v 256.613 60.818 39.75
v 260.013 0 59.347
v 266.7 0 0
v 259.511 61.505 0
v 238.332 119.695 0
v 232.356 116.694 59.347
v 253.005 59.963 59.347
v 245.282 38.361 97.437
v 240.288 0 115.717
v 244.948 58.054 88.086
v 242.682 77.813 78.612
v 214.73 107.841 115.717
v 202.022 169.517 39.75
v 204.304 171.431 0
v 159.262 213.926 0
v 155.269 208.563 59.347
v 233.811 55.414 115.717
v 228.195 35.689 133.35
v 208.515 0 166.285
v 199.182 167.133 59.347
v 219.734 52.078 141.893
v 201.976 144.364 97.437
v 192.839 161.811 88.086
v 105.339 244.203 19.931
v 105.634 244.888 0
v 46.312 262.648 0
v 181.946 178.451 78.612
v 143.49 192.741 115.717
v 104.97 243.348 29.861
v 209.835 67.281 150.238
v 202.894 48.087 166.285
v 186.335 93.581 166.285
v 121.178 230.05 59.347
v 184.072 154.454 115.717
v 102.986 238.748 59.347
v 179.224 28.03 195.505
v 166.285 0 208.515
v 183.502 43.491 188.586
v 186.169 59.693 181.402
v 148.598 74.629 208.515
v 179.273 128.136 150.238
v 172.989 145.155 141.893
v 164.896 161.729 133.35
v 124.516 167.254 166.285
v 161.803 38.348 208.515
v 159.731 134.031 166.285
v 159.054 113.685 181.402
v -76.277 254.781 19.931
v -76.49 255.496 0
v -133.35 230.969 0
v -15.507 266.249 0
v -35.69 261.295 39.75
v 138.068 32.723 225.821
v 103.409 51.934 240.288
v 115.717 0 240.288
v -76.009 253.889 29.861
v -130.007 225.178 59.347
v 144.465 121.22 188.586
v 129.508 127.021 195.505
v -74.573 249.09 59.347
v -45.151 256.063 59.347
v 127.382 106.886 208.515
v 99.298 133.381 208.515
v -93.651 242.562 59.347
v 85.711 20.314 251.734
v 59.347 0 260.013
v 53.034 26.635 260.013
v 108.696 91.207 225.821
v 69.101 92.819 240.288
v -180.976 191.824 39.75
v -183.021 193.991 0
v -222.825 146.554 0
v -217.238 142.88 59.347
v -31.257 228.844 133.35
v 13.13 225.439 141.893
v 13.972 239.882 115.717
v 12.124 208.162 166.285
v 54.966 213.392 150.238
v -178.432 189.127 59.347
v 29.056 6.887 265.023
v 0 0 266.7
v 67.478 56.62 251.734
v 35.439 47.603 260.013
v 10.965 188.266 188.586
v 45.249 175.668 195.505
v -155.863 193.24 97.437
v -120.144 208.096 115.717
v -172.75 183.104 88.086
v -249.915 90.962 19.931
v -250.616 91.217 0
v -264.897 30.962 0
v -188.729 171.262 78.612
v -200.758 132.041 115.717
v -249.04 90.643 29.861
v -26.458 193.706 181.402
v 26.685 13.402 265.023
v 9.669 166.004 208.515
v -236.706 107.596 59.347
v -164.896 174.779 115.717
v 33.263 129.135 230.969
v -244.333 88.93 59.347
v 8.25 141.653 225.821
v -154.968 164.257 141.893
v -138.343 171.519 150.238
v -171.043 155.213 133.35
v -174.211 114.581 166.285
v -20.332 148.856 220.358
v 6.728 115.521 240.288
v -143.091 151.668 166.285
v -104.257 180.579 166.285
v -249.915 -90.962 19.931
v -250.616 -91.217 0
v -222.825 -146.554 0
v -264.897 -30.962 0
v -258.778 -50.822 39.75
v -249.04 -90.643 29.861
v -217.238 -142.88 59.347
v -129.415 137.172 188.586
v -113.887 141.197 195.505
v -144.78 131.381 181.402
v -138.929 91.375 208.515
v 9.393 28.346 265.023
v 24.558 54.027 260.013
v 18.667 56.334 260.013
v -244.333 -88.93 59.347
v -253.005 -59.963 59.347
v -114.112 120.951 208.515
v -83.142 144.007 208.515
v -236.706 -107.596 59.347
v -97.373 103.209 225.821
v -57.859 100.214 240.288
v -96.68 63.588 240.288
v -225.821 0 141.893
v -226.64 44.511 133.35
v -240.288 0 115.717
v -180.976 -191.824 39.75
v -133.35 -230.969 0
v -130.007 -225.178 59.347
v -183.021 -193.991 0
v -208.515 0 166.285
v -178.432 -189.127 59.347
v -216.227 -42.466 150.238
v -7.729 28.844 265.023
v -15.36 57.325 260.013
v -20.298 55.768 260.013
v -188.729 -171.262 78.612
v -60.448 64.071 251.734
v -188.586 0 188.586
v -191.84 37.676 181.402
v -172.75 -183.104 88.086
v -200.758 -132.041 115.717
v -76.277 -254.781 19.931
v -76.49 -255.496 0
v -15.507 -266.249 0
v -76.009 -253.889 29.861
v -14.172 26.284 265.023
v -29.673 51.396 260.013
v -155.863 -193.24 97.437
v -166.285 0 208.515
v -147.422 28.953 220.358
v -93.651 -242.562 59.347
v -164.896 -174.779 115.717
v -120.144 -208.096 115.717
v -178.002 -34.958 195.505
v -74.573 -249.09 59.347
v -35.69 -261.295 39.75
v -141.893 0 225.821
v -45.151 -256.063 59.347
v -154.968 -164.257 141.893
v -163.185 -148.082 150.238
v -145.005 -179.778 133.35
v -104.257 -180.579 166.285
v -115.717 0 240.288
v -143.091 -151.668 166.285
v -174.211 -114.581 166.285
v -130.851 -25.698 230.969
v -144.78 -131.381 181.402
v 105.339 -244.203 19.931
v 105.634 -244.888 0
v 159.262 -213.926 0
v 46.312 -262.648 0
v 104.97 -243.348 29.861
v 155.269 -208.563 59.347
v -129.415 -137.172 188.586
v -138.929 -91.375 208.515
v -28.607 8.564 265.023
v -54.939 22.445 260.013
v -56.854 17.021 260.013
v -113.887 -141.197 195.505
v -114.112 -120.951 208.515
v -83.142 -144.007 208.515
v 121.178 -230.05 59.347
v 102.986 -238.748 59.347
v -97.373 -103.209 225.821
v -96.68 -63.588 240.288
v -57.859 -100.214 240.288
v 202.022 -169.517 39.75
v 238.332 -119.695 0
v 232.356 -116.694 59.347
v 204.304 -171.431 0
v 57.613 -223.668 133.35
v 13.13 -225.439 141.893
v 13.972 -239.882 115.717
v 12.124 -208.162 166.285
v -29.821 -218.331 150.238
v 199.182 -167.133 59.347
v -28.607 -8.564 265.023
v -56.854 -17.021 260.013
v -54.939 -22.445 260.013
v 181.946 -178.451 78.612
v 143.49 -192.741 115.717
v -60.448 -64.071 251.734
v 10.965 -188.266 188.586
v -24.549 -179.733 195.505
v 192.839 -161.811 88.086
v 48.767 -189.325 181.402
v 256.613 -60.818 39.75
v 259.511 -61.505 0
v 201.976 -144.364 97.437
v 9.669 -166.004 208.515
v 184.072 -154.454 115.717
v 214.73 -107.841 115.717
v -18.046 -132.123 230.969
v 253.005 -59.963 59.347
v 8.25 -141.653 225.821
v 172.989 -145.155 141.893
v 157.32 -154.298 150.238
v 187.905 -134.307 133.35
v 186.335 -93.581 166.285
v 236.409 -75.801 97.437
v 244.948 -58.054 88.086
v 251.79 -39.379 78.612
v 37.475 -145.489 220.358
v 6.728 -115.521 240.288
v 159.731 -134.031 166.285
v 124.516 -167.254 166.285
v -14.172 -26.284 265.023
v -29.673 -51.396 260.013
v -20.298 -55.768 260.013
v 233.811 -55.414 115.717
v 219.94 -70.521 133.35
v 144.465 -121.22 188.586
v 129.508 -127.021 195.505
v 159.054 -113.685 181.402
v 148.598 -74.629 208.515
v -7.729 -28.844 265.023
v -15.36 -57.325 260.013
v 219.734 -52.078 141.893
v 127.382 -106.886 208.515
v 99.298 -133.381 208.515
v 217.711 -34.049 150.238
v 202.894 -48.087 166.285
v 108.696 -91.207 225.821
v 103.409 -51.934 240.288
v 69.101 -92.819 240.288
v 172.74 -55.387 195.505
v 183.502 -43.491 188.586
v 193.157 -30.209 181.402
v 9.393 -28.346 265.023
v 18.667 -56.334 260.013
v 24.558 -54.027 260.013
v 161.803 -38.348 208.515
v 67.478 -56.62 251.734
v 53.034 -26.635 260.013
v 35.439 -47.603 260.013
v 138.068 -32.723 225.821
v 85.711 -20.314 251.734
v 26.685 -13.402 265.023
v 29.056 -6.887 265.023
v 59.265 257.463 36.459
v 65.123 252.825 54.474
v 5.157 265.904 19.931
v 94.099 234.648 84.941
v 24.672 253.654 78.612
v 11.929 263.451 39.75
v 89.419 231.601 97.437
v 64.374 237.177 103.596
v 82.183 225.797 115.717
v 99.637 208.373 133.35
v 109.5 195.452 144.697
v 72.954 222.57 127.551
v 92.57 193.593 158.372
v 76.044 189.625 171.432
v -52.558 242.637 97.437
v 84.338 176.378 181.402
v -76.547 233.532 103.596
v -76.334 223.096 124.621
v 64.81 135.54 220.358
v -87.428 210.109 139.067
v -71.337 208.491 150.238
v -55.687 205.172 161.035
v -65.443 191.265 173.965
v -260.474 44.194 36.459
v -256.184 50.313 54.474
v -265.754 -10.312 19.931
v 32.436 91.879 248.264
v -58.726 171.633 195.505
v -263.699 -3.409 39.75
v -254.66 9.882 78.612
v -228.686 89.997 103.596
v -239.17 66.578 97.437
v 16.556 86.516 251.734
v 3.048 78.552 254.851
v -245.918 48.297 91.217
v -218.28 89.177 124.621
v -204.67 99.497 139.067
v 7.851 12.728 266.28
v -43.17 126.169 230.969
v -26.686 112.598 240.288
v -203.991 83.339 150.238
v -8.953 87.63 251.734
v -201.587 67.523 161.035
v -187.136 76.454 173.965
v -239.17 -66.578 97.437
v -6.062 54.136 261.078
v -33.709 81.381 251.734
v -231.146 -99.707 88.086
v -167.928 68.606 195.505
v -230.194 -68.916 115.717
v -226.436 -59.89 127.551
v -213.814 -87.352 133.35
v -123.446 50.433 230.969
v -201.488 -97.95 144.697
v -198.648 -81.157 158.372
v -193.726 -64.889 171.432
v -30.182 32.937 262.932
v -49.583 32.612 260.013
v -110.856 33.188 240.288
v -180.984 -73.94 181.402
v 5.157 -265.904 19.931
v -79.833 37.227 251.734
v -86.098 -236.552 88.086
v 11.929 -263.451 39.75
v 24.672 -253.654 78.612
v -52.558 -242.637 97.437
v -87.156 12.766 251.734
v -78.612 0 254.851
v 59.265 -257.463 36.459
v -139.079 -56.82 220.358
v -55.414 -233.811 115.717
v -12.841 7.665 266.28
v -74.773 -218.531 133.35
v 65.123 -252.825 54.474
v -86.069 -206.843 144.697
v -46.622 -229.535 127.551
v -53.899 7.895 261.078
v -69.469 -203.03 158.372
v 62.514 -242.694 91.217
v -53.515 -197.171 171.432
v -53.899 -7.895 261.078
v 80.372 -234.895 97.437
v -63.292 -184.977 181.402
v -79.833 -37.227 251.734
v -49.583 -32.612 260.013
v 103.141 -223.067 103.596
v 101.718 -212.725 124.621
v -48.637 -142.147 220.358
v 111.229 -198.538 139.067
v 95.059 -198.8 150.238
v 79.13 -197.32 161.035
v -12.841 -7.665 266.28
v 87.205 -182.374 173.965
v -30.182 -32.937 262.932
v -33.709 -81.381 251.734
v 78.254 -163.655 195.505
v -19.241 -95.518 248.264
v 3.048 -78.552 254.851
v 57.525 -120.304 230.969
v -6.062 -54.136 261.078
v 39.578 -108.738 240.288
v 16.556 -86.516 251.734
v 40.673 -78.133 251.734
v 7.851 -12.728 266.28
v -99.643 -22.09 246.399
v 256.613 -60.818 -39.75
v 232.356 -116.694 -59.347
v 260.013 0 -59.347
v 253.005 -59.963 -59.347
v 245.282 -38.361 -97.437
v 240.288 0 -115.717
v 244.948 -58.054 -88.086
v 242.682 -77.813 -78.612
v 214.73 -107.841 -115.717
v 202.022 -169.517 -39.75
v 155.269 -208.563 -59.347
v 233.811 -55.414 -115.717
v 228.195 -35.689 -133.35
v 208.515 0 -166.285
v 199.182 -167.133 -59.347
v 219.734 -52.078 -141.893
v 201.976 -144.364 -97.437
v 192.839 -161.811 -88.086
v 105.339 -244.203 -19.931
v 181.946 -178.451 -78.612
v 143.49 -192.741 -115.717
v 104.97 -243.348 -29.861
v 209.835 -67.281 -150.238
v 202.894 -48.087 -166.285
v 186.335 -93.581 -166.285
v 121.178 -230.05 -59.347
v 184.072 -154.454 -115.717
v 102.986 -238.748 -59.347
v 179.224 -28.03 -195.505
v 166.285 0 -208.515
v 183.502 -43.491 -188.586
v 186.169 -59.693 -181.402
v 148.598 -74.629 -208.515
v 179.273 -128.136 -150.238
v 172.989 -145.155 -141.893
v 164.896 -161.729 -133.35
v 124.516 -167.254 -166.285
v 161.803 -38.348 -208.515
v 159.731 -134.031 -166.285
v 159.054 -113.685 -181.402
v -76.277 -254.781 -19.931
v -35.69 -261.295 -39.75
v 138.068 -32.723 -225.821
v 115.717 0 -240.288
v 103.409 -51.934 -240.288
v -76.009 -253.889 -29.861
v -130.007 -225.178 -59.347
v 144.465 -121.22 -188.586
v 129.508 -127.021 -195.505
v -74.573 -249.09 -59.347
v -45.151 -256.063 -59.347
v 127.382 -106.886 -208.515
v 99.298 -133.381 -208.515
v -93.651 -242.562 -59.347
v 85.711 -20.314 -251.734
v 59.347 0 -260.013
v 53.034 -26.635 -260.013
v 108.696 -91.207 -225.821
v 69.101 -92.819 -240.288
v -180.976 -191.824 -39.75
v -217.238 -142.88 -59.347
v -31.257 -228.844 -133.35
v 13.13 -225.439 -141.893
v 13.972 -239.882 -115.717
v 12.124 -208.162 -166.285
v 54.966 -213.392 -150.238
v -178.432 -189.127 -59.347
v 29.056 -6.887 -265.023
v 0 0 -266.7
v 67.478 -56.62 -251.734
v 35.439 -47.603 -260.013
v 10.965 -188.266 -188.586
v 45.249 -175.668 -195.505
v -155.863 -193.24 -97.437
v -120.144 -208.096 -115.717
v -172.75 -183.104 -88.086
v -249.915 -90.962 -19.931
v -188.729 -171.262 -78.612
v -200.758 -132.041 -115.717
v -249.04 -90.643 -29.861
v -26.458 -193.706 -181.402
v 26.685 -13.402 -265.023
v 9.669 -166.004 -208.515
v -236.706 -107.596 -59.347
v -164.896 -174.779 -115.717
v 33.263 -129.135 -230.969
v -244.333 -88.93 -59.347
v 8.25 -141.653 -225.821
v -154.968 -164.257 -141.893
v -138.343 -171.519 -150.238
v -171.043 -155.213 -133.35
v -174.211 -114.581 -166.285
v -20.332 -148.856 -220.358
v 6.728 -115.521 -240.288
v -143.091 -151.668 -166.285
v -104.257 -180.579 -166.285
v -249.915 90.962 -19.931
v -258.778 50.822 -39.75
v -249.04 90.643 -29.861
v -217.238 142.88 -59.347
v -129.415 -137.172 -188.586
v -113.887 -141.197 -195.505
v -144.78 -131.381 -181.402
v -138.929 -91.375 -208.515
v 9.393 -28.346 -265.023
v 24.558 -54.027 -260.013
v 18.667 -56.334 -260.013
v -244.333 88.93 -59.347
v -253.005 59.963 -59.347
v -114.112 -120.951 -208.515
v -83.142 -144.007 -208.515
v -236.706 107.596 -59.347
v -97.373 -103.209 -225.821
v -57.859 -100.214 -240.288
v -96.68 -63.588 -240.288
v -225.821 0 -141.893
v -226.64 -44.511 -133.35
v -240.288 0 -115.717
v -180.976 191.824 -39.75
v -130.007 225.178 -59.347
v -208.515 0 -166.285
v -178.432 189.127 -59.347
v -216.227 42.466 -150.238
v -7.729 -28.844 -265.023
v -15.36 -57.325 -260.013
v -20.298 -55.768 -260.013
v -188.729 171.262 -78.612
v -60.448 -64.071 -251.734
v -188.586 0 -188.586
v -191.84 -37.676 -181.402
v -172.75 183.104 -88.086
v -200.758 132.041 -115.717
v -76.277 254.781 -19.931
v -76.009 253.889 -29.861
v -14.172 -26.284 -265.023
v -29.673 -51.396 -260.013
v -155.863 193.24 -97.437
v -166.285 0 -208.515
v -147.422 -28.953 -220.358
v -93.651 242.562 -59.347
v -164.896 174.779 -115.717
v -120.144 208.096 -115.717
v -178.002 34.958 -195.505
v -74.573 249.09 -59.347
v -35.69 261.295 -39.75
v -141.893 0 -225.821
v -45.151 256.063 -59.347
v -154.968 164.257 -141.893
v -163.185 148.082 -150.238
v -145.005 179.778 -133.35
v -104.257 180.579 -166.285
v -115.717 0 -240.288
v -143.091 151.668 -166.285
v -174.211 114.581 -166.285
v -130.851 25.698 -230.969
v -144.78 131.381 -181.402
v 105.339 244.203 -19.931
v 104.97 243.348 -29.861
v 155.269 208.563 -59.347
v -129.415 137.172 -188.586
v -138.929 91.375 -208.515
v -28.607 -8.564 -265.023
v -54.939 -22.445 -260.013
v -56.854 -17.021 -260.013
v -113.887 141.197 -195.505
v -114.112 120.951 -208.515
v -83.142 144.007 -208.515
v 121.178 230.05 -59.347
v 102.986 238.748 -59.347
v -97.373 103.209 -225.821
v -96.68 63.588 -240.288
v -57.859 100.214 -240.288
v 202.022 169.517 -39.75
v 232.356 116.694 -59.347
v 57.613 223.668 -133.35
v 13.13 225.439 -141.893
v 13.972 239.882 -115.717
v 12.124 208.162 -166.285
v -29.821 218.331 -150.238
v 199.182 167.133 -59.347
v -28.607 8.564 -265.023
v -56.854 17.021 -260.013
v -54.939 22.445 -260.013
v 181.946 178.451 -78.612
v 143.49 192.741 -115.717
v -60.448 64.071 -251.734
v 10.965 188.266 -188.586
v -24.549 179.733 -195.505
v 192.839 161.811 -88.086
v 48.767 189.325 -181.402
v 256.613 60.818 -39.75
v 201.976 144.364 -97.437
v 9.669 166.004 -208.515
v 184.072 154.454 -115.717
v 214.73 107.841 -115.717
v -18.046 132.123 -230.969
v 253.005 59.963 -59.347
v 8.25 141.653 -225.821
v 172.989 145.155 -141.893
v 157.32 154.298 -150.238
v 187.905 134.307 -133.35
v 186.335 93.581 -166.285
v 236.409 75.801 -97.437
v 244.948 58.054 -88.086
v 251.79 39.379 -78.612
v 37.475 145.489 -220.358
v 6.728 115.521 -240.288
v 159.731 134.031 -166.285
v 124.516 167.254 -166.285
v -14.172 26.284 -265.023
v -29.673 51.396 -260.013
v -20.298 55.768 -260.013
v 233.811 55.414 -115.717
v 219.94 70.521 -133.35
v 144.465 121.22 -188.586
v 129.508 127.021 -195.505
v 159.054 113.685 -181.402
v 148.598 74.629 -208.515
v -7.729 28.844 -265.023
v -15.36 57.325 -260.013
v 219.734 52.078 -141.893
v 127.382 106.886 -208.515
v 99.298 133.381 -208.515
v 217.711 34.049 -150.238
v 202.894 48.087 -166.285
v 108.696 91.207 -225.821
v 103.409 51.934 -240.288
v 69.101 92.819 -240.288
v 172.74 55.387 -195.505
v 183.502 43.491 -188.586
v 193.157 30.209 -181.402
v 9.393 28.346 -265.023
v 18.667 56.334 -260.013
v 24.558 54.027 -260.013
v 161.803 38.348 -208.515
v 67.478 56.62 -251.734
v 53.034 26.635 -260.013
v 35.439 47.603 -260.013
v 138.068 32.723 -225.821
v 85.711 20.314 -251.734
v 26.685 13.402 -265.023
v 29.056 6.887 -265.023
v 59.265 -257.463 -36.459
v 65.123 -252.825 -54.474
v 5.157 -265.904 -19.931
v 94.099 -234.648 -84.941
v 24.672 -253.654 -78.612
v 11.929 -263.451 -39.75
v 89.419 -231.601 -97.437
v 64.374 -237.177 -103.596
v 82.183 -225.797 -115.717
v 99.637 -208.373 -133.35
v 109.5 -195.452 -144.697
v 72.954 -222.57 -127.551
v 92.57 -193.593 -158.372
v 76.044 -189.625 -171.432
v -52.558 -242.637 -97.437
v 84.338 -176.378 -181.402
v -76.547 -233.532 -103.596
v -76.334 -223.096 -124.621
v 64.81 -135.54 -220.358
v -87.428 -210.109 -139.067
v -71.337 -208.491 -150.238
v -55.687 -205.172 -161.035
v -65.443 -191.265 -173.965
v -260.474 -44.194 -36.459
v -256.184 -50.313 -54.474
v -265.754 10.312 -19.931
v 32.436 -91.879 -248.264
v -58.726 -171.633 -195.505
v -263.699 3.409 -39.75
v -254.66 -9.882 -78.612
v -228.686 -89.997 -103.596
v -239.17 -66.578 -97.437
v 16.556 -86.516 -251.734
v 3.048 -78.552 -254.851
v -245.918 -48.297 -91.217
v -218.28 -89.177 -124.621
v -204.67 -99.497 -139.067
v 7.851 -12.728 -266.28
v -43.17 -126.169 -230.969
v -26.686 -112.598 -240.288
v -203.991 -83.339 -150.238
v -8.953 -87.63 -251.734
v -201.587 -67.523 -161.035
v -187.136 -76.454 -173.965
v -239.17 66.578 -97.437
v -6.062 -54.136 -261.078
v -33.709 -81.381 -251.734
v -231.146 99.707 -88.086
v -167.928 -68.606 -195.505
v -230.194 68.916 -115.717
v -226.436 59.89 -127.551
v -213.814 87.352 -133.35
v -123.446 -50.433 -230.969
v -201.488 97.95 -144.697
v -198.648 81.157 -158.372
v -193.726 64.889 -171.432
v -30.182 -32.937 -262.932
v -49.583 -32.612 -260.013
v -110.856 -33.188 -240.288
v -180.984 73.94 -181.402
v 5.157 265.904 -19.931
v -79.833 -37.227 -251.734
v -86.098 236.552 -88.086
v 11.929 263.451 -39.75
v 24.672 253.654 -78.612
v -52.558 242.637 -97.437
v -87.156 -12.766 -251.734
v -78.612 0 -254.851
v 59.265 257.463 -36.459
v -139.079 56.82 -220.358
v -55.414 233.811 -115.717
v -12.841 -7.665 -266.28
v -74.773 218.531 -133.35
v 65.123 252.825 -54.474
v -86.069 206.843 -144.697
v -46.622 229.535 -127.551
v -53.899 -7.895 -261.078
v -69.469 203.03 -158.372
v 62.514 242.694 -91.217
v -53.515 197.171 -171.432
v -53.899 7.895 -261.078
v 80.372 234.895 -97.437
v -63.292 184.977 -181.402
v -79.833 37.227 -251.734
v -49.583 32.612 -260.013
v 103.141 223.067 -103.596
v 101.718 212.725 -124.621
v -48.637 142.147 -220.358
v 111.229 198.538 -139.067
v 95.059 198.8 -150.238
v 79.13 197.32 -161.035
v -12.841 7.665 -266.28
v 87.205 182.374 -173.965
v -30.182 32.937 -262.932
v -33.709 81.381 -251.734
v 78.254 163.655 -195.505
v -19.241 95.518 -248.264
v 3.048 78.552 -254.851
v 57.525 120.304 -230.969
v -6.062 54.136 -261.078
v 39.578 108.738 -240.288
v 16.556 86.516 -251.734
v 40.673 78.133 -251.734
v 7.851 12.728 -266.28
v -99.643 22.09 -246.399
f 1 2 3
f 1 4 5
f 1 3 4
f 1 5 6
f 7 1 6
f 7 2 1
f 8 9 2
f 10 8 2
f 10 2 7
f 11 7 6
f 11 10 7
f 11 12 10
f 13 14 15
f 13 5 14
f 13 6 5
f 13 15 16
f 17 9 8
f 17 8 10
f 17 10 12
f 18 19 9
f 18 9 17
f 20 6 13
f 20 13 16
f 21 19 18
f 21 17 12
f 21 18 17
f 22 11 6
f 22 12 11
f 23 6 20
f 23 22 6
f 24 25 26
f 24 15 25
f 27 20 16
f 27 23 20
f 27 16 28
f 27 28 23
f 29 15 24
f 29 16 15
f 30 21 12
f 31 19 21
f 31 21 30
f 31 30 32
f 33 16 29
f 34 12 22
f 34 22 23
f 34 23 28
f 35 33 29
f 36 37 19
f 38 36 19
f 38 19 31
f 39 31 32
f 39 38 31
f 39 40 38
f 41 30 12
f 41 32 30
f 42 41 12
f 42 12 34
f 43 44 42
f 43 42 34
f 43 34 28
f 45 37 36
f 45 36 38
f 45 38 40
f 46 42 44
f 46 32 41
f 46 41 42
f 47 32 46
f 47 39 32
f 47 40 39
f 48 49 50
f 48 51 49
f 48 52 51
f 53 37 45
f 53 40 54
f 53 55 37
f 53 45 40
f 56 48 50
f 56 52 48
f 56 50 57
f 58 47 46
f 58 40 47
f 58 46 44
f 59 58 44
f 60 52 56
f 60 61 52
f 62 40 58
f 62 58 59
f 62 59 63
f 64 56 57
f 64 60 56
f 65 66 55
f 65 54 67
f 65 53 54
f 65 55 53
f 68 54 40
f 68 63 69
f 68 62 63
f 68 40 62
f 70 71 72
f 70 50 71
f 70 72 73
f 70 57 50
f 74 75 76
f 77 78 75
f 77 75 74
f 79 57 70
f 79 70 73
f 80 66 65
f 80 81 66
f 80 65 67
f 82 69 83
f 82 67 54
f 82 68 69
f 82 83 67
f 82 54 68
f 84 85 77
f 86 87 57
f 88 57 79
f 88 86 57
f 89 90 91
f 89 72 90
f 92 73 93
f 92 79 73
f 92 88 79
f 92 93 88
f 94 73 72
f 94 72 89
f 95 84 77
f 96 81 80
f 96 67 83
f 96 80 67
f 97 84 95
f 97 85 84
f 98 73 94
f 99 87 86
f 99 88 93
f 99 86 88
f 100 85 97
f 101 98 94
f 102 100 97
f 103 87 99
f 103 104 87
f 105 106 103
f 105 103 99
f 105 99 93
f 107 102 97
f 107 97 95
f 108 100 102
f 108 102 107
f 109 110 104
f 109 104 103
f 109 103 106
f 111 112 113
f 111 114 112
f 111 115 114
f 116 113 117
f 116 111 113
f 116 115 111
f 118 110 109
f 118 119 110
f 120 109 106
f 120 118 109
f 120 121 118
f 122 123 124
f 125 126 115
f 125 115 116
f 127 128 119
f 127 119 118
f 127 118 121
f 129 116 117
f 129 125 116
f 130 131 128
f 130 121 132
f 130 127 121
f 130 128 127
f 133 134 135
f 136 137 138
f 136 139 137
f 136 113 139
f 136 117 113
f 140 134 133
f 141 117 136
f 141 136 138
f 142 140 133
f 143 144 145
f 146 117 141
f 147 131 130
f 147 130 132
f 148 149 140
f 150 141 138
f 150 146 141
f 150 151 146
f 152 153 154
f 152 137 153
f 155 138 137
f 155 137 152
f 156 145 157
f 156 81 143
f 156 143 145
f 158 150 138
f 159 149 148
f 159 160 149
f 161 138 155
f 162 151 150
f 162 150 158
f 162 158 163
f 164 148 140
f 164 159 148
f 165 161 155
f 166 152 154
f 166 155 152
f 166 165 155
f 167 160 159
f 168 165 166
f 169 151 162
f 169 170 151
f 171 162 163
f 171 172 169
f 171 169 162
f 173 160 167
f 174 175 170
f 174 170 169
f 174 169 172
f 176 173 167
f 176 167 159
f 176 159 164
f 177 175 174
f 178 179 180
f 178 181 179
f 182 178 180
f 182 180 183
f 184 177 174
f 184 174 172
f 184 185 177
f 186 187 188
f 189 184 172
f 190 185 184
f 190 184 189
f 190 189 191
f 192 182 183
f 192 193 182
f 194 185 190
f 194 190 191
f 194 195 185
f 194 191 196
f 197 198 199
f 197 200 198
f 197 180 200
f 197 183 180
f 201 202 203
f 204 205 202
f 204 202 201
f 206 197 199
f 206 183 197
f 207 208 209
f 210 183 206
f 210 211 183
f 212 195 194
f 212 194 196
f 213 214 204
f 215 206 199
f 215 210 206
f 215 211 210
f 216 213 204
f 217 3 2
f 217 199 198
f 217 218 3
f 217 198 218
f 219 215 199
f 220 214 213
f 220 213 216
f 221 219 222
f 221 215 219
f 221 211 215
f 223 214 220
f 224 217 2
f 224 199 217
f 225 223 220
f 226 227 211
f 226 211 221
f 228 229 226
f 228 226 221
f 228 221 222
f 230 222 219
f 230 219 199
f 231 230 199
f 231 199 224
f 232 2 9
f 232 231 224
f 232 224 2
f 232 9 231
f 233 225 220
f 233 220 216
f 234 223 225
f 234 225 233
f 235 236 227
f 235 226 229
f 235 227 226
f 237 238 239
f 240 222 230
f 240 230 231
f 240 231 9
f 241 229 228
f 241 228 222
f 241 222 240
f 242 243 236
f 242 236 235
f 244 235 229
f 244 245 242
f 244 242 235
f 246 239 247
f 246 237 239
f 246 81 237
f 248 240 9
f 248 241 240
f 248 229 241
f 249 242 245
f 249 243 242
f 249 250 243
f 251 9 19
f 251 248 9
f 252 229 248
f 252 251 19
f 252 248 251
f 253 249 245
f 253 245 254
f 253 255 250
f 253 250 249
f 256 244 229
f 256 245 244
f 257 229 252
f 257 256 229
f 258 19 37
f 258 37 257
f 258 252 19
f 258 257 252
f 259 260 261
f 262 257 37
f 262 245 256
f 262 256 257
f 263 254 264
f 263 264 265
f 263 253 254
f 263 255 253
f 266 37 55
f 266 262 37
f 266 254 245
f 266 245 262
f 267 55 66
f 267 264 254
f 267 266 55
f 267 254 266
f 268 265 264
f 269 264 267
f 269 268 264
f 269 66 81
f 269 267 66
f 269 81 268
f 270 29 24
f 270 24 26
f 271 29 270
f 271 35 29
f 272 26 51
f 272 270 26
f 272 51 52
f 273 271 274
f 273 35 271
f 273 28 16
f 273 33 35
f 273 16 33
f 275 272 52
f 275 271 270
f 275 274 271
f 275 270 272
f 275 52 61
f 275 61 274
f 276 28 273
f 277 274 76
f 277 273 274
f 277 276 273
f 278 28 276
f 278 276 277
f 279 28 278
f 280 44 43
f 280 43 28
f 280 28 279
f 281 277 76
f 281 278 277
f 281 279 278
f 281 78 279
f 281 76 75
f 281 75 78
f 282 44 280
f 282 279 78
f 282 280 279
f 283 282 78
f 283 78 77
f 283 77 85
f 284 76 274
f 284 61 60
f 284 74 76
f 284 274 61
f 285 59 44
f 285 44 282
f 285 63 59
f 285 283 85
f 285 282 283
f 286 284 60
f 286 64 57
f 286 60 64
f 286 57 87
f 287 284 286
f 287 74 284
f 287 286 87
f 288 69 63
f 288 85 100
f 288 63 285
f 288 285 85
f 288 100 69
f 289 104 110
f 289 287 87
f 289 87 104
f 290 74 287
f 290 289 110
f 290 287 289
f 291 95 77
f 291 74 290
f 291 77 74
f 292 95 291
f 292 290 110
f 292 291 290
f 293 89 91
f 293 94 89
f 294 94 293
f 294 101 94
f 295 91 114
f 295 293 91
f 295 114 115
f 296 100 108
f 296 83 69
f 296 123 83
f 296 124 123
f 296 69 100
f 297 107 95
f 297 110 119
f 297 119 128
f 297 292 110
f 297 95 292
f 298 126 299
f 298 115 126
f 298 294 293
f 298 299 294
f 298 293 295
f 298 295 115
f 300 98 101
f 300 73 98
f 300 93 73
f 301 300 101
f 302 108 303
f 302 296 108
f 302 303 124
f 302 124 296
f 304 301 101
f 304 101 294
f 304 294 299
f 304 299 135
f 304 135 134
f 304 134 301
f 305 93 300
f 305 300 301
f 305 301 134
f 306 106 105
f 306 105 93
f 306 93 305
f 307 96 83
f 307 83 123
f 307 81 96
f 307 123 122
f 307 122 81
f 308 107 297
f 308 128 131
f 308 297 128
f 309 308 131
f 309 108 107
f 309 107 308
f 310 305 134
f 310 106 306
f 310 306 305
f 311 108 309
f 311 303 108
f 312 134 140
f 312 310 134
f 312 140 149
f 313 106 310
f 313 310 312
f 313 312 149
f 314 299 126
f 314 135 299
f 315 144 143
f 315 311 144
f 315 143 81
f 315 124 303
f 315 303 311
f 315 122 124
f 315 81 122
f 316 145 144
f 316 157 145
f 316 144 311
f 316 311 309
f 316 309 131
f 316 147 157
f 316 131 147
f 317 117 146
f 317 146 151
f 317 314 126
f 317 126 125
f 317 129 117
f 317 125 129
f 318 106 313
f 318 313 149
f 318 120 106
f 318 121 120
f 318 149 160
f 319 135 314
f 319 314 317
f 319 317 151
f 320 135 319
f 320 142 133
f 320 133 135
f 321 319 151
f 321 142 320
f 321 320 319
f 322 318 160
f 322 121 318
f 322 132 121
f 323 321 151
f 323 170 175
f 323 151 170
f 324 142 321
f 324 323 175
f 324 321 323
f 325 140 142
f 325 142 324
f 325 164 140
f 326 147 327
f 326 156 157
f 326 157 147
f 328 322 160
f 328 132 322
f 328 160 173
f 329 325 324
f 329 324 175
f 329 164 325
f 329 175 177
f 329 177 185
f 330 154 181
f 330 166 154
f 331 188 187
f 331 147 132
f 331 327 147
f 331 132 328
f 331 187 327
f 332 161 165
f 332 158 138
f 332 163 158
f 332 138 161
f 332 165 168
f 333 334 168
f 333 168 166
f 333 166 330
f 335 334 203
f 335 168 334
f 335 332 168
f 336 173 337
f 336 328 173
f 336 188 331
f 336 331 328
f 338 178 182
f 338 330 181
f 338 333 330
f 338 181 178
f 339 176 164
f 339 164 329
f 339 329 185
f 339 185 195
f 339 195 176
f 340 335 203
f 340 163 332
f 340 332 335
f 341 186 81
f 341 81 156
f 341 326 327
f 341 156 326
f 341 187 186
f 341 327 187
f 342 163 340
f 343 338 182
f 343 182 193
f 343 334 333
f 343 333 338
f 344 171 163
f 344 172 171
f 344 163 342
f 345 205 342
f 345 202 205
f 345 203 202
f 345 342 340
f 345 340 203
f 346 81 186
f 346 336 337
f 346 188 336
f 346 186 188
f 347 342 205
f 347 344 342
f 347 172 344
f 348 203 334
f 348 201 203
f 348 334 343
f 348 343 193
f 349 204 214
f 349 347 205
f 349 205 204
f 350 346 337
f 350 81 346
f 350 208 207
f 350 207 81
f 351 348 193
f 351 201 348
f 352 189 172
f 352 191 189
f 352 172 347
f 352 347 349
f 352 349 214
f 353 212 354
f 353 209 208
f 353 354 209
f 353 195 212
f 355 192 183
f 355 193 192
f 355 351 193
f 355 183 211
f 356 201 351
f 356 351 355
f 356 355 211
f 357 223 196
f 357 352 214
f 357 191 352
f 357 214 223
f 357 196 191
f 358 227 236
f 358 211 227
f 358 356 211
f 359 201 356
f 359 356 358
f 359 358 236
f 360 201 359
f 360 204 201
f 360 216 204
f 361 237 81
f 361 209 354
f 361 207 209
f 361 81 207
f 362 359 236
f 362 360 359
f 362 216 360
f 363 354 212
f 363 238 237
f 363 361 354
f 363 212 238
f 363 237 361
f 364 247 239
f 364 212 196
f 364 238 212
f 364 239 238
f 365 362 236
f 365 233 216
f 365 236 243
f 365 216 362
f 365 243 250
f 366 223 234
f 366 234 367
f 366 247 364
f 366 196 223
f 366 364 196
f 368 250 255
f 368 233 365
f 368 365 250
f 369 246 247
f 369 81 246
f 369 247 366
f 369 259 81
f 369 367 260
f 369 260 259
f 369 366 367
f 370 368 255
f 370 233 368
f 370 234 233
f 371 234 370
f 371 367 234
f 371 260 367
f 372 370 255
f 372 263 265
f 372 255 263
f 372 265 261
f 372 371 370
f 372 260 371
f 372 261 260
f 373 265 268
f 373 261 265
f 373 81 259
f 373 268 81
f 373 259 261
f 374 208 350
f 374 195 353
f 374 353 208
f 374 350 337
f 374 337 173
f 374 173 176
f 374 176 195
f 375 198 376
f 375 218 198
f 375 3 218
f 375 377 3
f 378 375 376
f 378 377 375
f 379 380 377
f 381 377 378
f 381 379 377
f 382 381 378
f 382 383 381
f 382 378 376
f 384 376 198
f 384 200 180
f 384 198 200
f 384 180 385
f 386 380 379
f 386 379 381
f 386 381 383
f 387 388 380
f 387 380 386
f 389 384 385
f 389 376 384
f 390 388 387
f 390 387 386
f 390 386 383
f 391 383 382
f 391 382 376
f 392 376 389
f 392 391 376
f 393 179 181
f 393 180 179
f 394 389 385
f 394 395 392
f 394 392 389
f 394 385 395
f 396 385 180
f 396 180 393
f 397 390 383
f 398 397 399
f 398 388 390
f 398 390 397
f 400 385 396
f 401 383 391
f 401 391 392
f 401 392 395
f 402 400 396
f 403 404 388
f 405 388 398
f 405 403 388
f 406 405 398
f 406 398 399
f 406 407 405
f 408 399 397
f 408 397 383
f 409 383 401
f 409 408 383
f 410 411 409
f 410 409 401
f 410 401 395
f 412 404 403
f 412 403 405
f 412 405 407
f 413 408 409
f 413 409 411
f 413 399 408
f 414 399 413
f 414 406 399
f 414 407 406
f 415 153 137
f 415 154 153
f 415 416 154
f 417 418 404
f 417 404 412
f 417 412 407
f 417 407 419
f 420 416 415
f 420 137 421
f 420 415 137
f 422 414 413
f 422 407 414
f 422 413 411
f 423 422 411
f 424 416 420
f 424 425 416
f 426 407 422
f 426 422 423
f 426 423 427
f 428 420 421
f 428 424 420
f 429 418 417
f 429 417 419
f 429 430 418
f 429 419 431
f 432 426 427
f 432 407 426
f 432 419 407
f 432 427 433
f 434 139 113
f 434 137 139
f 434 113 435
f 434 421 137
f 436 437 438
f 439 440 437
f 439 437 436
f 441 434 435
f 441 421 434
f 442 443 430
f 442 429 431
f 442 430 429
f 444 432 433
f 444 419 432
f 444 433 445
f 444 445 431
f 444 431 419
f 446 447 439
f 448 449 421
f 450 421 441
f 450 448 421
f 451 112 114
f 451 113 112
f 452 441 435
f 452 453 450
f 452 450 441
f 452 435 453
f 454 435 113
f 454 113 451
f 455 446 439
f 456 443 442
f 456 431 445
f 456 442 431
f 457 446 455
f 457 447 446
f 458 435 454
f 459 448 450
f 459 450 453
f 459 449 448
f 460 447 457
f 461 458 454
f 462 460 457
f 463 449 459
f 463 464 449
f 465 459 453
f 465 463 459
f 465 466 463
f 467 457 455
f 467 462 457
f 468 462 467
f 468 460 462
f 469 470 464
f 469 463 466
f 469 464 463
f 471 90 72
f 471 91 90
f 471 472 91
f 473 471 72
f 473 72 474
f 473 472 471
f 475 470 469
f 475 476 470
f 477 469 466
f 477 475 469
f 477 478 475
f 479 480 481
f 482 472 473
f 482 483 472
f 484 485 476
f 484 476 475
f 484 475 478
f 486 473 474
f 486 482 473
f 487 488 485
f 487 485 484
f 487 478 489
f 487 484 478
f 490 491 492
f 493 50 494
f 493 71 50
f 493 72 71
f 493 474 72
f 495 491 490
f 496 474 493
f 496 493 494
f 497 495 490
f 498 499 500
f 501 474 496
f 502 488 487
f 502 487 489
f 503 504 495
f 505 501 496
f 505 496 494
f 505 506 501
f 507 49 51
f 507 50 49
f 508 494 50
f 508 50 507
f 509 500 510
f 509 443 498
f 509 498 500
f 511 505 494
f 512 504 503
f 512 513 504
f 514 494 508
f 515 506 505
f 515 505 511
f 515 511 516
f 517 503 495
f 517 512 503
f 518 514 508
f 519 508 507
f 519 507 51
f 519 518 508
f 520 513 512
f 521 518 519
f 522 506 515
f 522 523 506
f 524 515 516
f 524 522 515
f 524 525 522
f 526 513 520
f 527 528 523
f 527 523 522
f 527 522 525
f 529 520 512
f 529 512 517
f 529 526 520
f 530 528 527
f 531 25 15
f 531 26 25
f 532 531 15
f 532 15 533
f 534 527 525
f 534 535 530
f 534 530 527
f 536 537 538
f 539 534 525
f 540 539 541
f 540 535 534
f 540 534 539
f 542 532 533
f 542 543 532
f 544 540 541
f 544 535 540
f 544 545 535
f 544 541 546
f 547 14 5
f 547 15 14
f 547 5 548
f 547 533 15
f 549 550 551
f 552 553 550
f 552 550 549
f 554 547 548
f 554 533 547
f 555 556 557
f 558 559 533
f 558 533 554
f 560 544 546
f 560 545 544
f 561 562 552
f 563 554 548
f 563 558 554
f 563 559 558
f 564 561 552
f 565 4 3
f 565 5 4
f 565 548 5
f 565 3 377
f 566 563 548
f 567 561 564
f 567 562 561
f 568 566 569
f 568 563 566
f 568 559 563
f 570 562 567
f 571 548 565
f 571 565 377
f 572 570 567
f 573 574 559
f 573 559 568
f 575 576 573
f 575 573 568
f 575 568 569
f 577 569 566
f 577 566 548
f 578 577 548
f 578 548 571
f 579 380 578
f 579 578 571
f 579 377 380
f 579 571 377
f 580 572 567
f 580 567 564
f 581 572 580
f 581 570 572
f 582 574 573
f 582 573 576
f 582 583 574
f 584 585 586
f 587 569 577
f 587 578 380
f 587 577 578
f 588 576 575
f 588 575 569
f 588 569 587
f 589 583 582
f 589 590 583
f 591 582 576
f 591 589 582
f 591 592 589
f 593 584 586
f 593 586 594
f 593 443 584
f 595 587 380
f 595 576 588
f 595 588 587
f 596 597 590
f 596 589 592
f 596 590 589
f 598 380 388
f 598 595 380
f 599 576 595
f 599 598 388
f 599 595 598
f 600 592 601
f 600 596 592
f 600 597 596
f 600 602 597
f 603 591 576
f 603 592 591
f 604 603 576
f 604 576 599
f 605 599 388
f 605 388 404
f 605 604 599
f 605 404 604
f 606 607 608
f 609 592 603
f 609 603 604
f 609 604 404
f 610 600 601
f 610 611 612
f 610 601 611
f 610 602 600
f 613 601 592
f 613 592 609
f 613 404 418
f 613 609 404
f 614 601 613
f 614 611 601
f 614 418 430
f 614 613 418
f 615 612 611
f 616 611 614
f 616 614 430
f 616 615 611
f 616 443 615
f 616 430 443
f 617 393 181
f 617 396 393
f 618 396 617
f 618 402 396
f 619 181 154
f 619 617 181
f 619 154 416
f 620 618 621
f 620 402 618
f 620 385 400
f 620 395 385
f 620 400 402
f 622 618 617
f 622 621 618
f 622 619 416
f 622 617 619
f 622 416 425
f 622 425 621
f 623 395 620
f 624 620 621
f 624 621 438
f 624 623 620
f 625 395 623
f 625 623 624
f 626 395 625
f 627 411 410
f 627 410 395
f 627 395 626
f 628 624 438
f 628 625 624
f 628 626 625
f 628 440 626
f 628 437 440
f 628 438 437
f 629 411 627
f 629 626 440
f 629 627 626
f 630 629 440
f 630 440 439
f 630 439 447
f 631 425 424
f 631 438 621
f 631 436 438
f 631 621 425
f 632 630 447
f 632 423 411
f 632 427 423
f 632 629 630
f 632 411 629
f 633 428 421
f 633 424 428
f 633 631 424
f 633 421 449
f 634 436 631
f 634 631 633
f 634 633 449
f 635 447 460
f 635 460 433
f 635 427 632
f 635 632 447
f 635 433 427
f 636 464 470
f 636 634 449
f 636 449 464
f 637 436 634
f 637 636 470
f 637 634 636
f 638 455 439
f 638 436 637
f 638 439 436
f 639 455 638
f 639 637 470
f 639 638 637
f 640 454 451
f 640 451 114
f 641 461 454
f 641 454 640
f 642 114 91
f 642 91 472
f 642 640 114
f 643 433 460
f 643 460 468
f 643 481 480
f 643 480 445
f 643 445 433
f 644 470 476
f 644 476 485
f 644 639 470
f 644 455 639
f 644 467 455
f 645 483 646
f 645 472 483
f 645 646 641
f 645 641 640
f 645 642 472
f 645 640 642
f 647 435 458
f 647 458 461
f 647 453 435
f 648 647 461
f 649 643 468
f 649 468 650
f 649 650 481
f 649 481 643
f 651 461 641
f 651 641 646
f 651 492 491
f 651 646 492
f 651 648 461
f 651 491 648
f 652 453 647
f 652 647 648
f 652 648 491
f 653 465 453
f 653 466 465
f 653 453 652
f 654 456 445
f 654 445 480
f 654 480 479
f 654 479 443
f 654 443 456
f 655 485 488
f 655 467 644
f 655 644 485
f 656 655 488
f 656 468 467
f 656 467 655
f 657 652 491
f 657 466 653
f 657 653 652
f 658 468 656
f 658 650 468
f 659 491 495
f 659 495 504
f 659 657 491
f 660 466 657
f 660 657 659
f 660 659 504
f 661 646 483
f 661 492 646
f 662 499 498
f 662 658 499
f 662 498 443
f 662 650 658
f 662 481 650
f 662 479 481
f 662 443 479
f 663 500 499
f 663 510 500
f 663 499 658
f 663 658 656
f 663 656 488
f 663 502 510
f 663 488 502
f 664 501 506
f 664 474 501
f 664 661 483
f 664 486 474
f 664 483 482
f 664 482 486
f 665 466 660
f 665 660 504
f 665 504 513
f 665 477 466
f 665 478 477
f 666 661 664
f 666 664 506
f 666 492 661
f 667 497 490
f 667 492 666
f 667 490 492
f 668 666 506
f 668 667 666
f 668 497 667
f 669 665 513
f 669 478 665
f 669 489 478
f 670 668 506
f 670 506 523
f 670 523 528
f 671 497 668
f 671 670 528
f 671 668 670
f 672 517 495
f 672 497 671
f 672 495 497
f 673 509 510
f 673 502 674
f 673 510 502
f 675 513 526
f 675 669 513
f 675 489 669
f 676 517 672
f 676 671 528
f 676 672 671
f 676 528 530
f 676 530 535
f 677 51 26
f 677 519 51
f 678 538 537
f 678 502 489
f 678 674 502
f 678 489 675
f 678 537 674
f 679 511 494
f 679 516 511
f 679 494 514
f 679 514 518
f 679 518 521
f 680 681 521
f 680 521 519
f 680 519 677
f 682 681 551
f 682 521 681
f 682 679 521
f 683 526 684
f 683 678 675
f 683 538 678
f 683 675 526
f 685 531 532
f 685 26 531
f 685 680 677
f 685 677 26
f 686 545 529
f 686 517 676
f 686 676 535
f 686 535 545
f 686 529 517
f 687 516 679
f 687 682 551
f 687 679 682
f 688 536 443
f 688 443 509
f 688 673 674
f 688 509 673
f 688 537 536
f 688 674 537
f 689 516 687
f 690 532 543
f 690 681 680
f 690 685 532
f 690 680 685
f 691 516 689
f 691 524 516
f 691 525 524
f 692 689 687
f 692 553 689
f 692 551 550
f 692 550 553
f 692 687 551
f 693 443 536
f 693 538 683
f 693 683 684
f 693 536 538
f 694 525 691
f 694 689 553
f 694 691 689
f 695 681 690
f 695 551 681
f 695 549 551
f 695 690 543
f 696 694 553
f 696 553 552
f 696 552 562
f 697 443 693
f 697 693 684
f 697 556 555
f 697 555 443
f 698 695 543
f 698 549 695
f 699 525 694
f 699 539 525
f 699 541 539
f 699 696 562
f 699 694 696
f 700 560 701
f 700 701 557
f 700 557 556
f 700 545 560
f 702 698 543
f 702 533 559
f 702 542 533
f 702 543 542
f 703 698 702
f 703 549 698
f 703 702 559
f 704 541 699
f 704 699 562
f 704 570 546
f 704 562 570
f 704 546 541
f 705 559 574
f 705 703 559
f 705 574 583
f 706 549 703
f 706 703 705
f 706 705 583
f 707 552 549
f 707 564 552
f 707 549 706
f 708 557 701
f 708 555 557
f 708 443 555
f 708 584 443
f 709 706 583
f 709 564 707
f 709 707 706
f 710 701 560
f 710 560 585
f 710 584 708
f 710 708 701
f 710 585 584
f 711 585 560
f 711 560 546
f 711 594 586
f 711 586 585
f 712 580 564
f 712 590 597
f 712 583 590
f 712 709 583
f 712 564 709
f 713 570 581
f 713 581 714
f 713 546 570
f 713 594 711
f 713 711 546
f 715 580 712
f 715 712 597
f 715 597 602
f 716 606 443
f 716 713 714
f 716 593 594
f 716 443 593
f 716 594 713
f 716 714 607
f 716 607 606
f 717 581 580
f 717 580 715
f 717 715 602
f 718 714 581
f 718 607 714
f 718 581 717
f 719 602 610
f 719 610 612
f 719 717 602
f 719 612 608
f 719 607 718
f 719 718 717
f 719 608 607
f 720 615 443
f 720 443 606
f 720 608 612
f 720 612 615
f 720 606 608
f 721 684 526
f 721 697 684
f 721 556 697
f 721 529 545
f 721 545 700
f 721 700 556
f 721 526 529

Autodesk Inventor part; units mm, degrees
ref_plane "YZ Plane" through (0, 0, 0) normal (1, 0, 0) x (0, 1, 0)
ref_plane "XZ Plane" through (0, 0, 0) normal (0, 1, 0) x (-1, 0, 0)
ref_plane "XY Plane" through (0, 0, 0) normal (0, 0, 1) x (1, 0, 0)
sketch "Sketch1" plane through (0, 0, 0) normal (0, 0, 1) x (1, 0, 0)
  circle A0 centre (0, 0) radius 266.7
  line L0 (0, 266.7) -> (339.5925, 0)
  line L1 (339.5925, 0) -> (0, 0)
  line L2 (0, 0) -> (0, 266.7)
  dimension "d0" = 533.4
  dimension "d6" = 431.8008
  dimension "d7" = 266.7
  dimension "d8" = 339.5925
extrude "Extrusion1" add sketch "Sketch1" along normal mid plane 533.4 contours L2 L1 A0 | A0 L0 | L0 A0 L1 L2
fillet "Fillet1" radius 266.7 1 edges at (-266.7, 0, 266.7)
sketch "Sketch2" plane through (0, 0, -266.7) normal (0, 0, -1) x (-1, 0, 0)
  point P0 (0, 0)
fillet "Fillet2" radius 266.7 1 edges at (-266.7, 0, -266.7)
properties part number "CapBall2" material "Rubber"
